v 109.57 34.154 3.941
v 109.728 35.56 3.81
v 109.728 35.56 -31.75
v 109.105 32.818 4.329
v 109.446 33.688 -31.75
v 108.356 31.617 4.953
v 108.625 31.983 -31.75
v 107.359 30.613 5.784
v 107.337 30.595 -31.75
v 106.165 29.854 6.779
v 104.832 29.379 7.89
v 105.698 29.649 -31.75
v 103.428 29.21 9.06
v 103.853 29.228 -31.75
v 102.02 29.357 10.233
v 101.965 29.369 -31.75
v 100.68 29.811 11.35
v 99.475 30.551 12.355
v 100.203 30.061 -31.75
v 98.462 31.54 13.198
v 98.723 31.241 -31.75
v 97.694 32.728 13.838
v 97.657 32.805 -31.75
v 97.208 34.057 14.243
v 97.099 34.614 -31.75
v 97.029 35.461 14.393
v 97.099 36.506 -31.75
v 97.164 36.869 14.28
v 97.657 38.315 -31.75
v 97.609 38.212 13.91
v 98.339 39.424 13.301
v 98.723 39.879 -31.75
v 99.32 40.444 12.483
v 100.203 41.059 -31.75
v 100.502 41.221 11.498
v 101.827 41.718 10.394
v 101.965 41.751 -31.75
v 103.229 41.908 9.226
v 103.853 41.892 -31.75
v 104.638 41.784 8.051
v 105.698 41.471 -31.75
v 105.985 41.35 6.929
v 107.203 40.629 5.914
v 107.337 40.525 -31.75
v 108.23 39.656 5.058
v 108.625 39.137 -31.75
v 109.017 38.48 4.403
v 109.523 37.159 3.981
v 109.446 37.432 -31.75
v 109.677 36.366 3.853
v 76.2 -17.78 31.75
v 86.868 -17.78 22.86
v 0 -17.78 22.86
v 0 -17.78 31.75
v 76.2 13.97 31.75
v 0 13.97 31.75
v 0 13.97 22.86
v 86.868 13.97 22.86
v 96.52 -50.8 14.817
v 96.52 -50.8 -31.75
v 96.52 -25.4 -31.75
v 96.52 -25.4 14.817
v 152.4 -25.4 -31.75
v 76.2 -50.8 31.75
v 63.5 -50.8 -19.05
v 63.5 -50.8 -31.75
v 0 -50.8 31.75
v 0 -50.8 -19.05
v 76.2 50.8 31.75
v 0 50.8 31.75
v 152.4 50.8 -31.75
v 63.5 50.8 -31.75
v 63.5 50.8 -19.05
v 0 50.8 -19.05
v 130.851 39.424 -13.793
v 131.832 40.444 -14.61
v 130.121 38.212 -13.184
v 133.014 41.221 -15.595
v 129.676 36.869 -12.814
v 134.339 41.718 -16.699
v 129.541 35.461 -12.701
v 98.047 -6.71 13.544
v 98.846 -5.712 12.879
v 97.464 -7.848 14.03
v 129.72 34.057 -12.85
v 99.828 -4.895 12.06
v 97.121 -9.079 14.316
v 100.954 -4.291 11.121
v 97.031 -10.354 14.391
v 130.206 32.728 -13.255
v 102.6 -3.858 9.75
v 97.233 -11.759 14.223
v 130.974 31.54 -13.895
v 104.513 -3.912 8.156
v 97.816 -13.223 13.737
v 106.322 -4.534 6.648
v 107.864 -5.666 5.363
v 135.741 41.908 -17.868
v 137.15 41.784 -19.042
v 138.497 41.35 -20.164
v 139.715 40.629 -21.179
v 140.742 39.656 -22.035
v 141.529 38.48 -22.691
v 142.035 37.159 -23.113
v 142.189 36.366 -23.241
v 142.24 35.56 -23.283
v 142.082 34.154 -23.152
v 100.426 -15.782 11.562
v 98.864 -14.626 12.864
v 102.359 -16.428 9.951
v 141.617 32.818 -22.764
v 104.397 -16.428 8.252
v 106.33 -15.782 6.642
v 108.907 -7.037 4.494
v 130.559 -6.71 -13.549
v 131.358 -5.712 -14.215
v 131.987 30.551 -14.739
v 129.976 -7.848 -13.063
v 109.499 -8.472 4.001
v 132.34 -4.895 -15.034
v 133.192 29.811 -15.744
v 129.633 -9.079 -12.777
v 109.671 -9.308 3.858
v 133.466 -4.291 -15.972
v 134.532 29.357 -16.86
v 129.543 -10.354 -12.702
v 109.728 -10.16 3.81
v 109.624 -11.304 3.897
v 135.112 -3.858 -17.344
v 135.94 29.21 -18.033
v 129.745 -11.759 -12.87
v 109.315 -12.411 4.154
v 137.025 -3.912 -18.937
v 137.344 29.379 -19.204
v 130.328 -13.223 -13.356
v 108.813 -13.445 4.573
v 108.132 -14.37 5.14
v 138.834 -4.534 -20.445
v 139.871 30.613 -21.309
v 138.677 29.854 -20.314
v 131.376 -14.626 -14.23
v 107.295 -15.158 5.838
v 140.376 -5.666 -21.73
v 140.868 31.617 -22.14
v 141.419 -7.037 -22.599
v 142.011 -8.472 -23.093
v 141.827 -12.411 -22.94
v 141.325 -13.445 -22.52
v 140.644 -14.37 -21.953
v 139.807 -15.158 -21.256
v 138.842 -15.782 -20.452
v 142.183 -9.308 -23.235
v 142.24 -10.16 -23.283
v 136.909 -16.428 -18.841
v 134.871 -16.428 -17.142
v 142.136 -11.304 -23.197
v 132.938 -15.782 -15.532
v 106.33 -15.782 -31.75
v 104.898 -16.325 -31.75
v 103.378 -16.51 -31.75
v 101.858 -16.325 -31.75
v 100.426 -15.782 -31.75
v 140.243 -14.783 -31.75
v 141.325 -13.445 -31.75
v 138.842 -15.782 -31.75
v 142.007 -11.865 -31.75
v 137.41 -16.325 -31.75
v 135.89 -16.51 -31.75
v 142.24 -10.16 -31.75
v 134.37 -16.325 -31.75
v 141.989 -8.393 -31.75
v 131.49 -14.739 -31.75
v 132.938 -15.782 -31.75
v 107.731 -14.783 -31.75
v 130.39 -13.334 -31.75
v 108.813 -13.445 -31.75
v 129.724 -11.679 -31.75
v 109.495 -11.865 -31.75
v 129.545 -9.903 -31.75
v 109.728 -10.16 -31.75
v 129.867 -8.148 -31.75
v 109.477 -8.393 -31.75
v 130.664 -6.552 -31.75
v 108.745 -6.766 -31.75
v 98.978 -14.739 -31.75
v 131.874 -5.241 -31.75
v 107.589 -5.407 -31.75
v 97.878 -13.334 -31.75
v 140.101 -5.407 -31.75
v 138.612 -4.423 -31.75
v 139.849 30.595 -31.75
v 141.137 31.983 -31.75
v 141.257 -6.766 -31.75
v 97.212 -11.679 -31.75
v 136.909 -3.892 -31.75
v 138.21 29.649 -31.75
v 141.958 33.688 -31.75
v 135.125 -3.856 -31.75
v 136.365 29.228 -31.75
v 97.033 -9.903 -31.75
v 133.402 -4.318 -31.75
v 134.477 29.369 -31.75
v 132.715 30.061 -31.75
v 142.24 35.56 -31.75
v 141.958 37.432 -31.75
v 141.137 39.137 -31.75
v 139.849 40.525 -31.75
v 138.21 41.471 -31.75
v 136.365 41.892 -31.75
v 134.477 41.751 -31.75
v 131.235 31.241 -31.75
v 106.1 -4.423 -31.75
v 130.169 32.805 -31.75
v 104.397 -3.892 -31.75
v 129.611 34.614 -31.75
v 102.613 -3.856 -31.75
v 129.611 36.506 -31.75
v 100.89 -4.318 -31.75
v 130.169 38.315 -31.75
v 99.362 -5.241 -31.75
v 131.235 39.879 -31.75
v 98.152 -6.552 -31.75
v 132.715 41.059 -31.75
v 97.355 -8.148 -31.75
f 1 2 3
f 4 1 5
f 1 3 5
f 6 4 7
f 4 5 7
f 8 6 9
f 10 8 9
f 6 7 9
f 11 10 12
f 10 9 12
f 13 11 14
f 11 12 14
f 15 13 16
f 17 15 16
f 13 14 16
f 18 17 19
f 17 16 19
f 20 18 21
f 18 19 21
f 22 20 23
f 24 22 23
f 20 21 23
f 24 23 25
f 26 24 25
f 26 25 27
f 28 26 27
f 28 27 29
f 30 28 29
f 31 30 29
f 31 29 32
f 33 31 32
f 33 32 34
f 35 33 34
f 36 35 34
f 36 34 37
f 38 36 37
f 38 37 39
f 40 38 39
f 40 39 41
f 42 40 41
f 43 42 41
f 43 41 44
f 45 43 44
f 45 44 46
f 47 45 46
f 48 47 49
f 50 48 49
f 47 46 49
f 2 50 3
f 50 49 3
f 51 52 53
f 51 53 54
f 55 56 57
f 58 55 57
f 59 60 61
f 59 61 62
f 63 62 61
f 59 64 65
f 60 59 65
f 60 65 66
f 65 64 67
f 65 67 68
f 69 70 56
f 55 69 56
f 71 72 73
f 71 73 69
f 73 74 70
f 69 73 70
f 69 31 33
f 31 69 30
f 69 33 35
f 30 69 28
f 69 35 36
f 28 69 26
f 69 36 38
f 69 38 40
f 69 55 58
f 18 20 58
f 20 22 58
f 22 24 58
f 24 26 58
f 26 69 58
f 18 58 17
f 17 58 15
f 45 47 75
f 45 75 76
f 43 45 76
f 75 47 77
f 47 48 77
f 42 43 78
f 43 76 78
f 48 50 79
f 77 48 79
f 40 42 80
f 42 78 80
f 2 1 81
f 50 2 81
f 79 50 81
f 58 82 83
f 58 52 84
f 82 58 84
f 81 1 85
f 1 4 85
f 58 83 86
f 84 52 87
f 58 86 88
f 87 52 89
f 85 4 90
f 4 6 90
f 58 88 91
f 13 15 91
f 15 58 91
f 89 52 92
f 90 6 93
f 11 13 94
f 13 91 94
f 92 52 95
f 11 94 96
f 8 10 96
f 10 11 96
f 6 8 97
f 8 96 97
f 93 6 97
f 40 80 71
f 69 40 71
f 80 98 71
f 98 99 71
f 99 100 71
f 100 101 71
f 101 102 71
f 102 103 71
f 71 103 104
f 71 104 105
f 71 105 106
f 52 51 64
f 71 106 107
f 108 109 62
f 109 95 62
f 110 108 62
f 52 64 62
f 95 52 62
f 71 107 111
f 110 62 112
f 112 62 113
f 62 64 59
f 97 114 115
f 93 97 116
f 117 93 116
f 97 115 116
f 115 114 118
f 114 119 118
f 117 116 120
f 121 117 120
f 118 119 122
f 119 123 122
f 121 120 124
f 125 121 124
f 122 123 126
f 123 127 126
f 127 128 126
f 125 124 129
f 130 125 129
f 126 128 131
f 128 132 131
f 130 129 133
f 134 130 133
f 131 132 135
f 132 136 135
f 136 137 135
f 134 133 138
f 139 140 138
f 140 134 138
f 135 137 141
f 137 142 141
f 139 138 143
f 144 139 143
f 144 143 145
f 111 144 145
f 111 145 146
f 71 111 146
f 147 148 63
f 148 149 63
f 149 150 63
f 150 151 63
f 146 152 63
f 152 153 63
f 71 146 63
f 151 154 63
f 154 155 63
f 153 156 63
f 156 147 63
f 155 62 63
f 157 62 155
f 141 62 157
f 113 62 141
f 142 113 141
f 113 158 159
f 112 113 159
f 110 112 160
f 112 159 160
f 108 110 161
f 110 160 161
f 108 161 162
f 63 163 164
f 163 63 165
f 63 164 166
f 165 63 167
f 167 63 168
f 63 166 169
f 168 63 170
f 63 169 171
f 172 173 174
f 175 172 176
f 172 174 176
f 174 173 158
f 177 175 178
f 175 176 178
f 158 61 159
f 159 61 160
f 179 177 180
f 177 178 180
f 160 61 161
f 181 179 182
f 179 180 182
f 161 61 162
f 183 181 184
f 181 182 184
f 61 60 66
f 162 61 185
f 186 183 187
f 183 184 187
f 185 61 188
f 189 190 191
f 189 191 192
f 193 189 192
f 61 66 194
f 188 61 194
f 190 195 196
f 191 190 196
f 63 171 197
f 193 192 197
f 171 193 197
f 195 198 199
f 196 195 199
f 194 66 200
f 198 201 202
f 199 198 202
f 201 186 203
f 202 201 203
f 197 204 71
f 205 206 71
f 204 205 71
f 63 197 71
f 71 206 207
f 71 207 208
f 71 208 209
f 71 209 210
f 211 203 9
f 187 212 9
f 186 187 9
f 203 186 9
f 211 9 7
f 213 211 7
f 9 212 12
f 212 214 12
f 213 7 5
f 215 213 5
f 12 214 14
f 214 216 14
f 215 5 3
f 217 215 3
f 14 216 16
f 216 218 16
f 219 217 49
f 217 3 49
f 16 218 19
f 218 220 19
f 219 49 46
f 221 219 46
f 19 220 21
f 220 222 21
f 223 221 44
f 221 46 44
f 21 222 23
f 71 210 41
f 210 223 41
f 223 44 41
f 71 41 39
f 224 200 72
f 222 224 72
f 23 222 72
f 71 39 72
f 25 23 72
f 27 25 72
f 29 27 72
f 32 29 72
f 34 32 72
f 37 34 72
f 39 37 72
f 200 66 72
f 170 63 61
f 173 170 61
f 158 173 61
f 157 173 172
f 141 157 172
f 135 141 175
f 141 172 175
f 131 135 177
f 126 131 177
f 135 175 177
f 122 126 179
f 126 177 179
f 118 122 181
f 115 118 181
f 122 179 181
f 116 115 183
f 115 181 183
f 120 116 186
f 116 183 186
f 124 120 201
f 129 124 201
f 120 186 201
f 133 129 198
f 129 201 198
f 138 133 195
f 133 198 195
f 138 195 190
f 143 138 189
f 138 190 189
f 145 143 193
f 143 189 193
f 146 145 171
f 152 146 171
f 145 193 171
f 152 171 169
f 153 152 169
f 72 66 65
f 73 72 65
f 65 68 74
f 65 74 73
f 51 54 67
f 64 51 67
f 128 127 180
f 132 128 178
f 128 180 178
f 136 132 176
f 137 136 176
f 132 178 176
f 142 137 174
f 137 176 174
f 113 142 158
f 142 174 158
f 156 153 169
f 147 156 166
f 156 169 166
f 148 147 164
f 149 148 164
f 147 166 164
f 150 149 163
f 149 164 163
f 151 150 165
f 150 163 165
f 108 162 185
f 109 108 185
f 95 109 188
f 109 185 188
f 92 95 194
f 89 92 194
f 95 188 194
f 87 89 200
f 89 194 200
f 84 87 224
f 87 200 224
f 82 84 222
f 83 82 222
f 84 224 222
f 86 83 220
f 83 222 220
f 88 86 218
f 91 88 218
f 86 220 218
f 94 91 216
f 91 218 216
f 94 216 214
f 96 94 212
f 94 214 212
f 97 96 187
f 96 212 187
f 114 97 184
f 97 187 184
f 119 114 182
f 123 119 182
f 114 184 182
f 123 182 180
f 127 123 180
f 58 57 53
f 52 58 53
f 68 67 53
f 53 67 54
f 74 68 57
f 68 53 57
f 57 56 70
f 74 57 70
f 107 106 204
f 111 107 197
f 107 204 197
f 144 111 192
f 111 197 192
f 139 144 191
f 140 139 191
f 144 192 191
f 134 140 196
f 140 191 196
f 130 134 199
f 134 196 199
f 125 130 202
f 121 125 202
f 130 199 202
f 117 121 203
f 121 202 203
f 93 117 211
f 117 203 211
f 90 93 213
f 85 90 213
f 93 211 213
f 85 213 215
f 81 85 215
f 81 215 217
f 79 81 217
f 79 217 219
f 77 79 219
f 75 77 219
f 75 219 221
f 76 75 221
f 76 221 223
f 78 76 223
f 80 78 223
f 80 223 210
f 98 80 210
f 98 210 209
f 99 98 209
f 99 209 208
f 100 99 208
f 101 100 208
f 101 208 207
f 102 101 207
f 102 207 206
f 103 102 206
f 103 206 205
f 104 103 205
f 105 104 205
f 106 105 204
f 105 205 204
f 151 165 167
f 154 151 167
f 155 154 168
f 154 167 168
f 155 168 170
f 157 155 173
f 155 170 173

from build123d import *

# Parameters (mm, degrees)
F1_DEPTH = 152.4
F2_W     = 63.5
F2_H     = 12.7
F3_DEPTH = 101.601
F2_W_2   = 55.88
F2_H_2   = 58.42
F4_DEPTH = 25.4
F6_DEPTH = 101.601
F7_R     = 6.35
F8_DEPTH = 63.501


with BuildPart() as f1:
    # F0 (on Right) → F1 (new body)
    with BuildSketch(Plane.YZ):
        Polygon((-17.78, 31.75), (-50.8, 31.75), (-50.8, -31.75), (50.8, -31.75), (50.8, 31.75), (13.97, 31.75), (13.97, 22.86), (-17.78, 22.86), align=None)
    extrude(amount=F1_DEPTH)

    # F2 (on face) → F3 (cut, through all)
    with BuildSketch(Plane.XZ.offset(50.8)):
        with Locations((31.75, -25.4)):
            Rectangle(F2_W, F2_H)
    extrude(amount=-F3_DEPTH, mode=Mode.SUBTRACT)

    # F2 (on face) → F4 (cut)
    with BuildSketch(Plane.XZ.offset(50.8)):
        with Locations((124.46, -2.54)):
            Rectangle(F2_W_2, F2_H_2)
    extrude(amount=-F4_DEPTH, mode=Mode.SUBTRACT)

    # F5 (on face) → F6 (cut, through all)
    with BuildSketch(Plane.XZ.offset(50.8)):
        Polygon((152.4, 26.67), (152.4, 31.75), (76.2, 31.75), (152.4, -31.75), align=None)
    extrude(amount=-F6_DEPTH, mode=Mode.SUBTRACT)

    # F7 (on face) → F8 (cut, through all)
    with BuildSketch(Plane(origin=(0, 0, -31.75), x_dir=(1, 0, 0), z_dir=(0, 0, -1))):
        with BuildLine():
            ThreePointArc((100.425931, 15.782081), (100.093425, 4.725474), (109.728, 10.16))
            ThreePointArc((109.728, 10.16), (108.812526, 13.444575), (106.330069, 15.782081))
            Line((106.330069, 15.782081), (100.425931, 15.782081))
        make_face()
        with BuildLine():
            ThreePointArc((138.842069, 15.782081), (135.89, 16.51), (132.937931, 15.782081))
            Line((132.937931, 15.782081), (138.842069, 15.782081))
        make_face()
        with BuildLine():
            Line((138.842069, 15.782081), (132.937931, 15.782081))
            ThreePointArc((132.937931, 15.782081), (132.605425, 4.725474), (142.24, 10.16))
            ThreePointArc((142.24, 10.16), (141.324526, 13.444575), (138.842069, 15.782081))
        make_face()
        with BuildLine():
            Line((100.425931, 15.782081), (106.330069, 15.782081))
            ThreePointArc((106.330069, 15.782081), (103.378, 16.51), (100.425931, 15.782081))
        make_face()
        with Locations((135.89, -35.56)):
            Circle(F7_R)
        with Locations((103.378, -35.56)):
            Circle(F7_R)
    extrude(amount=-F8_DEPTH, mode=Mode.SUBTRACT)


solid = f1.part
